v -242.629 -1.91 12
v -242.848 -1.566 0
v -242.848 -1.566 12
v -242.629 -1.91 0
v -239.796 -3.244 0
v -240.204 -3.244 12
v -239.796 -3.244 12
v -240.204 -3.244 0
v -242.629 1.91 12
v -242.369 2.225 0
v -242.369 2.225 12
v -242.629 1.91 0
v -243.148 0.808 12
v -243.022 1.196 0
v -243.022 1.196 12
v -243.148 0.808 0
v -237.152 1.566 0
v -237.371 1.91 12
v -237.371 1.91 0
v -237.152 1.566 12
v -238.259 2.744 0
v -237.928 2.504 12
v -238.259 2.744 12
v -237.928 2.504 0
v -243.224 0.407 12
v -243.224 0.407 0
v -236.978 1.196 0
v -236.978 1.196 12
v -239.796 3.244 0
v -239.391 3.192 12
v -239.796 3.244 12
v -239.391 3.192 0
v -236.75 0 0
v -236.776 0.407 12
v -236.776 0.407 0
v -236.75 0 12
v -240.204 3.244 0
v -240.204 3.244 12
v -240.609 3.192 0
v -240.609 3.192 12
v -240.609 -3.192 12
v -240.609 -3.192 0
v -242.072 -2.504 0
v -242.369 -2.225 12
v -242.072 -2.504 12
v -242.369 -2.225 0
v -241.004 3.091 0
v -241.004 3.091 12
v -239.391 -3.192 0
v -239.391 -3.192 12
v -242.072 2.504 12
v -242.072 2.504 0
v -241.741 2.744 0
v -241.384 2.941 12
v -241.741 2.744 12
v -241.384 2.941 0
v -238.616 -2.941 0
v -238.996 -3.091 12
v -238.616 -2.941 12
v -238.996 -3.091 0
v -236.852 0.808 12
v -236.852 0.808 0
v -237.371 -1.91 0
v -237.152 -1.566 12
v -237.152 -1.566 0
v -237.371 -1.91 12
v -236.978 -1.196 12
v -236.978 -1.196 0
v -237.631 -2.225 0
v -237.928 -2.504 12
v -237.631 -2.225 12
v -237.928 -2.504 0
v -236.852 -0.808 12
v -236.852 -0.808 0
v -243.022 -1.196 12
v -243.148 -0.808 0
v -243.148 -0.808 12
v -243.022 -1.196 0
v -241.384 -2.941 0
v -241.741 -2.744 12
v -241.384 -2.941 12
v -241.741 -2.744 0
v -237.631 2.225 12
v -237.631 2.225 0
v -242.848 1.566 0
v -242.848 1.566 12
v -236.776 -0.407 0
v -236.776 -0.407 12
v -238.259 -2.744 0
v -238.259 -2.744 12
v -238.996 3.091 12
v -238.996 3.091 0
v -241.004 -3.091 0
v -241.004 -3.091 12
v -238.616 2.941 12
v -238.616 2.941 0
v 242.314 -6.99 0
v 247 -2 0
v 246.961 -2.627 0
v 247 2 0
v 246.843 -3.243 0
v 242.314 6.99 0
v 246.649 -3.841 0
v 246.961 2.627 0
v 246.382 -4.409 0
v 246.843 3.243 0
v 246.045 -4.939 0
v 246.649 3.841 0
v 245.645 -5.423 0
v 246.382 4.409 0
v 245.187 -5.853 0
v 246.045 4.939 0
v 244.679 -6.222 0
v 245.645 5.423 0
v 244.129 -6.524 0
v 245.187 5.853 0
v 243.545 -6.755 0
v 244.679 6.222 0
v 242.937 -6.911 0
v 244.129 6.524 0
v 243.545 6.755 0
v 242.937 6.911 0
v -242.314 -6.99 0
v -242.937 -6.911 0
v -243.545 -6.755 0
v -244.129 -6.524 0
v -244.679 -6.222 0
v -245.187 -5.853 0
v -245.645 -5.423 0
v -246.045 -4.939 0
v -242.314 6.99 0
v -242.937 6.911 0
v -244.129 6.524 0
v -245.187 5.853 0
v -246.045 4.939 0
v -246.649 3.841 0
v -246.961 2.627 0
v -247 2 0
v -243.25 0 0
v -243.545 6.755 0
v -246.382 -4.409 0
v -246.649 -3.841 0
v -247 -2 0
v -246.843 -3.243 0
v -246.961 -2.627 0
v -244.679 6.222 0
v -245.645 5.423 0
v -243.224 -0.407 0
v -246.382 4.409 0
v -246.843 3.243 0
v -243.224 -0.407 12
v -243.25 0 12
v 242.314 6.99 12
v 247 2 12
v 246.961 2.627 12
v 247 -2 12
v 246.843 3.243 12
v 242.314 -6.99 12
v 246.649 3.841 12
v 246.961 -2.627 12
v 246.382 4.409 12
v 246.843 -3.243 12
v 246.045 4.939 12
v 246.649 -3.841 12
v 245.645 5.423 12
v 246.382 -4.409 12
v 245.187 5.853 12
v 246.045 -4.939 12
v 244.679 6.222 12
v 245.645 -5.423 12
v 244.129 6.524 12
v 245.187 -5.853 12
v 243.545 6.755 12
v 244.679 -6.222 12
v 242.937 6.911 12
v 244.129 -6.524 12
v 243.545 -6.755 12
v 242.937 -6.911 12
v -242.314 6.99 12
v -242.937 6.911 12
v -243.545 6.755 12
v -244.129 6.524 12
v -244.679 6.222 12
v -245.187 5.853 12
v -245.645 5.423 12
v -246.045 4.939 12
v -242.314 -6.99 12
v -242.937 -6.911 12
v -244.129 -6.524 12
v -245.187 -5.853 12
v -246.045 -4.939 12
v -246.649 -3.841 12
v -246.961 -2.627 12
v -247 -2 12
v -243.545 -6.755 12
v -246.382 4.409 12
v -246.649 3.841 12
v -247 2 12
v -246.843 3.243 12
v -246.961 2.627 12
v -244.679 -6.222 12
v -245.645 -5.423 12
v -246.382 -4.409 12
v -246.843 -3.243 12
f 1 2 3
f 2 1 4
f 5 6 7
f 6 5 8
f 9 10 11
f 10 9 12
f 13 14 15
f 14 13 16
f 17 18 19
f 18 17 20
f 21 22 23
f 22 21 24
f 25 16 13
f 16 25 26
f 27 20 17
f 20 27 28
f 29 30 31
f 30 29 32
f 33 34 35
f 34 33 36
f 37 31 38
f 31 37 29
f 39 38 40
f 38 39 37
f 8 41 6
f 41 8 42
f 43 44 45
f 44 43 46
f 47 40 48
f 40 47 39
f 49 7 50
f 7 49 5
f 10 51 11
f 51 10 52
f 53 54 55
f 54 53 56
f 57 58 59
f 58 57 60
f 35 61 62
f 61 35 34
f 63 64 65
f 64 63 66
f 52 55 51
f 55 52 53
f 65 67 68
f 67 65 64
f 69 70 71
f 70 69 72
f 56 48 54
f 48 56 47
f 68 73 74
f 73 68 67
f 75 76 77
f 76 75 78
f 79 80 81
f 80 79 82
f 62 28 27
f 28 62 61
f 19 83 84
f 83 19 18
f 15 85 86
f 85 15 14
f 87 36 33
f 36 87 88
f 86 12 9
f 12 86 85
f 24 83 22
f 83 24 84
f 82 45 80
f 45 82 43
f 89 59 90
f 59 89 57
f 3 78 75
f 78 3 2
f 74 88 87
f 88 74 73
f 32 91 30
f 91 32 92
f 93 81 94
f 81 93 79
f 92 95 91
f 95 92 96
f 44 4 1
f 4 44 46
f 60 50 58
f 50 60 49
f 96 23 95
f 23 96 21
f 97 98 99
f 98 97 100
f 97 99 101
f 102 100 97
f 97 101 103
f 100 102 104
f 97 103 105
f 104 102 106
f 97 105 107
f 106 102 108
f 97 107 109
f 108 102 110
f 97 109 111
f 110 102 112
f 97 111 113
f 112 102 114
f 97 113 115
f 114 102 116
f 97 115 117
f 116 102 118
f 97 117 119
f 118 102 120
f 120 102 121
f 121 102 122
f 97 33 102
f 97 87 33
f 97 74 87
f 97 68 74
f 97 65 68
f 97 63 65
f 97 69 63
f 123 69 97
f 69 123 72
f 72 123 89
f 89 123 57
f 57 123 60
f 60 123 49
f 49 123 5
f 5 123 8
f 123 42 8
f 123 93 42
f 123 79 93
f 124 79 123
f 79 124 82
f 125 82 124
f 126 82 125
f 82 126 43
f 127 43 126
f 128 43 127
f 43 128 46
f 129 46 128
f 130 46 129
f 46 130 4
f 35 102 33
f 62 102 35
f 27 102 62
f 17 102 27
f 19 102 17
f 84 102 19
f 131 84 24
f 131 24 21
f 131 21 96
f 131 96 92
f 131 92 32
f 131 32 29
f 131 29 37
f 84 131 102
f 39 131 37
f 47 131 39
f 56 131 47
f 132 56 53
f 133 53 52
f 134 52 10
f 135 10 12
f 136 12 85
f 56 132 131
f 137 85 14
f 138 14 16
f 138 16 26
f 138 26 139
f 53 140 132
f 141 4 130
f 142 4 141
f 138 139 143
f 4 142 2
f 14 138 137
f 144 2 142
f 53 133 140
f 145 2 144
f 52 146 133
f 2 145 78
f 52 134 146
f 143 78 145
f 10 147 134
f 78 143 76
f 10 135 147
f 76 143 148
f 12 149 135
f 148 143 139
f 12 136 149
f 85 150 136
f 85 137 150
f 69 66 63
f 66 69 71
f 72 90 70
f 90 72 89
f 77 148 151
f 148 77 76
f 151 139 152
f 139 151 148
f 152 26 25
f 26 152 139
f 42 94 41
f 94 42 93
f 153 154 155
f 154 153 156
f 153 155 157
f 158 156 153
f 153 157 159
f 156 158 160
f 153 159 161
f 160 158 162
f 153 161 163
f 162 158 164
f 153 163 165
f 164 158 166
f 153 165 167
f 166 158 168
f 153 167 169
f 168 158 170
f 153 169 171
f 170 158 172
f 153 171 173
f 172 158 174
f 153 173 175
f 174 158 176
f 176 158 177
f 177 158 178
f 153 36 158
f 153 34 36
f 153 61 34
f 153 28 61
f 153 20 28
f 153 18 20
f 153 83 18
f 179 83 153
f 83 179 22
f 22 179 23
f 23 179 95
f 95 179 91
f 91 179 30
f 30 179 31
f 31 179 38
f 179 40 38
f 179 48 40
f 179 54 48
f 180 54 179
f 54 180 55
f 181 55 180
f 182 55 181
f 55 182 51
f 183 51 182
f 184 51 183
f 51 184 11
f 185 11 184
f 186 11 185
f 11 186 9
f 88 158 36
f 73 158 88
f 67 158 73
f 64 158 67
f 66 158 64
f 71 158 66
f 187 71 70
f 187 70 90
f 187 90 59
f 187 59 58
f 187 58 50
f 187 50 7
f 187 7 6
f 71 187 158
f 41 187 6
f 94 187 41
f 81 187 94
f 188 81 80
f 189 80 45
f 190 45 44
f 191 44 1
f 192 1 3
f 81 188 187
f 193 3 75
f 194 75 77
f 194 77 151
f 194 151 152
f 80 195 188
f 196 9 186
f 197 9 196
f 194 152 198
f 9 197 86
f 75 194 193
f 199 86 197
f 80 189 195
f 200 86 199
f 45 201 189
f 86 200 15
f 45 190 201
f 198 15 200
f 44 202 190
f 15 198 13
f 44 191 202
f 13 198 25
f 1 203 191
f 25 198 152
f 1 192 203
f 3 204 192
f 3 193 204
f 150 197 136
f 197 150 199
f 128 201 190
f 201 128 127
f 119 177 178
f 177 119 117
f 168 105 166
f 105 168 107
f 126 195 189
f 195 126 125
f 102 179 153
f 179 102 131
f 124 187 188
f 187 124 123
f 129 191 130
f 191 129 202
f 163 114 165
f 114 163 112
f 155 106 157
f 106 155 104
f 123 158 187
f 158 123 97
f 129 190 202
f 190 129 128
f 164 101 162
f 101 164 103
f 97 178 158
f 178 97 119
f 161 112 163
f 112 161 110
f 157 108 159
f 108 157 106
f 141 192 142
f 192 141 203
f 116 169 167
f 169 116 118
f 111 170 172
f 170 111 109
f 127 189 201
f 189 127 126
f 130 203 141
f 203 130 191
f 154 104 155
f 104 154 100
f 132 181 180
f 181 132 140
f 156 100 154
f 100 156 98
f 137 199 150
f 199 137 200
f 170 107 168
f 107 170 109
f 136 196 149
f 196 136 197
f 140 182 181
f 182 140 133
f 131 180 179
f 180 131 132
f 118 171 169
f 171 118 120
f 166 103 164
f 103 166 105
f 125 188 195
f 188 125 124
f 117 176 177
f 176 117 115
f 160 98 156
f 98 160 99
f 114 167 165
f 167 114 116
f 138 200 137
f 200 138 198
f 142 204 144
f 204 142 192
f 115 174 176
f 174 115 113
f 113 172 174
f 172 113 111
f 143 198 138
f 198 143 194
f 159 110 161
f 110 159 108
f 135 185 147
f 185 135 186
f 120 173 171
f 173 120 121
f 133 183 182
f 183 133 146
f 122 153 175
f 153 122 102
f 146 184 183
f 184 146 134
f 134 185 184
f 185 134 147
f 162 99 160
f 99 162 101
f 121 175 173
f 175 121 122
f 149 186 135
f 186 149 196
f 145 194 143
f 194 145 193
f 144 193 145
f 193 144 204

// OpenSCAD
$fn = 50;


difference() {
	union() {
		hull() {
			translate(v = [-242.0000000000, 2.0000000000, 0]) {
				cylinder(h = 12, r = 5);
			}
			translate(v = [242.0000000000, 2.0000000000, 0]) {
				cylinder(h = 12, r = 5);
			}
			translate(v = [-242.0000000000, -2.0000000000, 0]) {
				cylinder(h = 12, r = 5);
			}
			translate(v = [242.0000000000, -2.0000000000, 0]) {
				cylinder(h = 12, r = 5);
			}
		}
	}
	union() {
		translate(v = [-240.0000000000, 0.0000000000, 0]) {
			cylinder(h = 12, r = 3.2500000000);
		}
		translate(v = [-240.0000000000, 0.0000000000, 0]) {
			cylinder(h = 12, r = 1.8000000000);
		}
		translate(v = [-240.0000000000, 0.0000000000, 0]) {
			cylinder(h = 12, r = 1.8000000000);
		}
		translate(v = [-240.0000000000, 0.0000000000, 0]) {
			cylinder(h = 12, r = 1.8000000000);
		}
	}
}
